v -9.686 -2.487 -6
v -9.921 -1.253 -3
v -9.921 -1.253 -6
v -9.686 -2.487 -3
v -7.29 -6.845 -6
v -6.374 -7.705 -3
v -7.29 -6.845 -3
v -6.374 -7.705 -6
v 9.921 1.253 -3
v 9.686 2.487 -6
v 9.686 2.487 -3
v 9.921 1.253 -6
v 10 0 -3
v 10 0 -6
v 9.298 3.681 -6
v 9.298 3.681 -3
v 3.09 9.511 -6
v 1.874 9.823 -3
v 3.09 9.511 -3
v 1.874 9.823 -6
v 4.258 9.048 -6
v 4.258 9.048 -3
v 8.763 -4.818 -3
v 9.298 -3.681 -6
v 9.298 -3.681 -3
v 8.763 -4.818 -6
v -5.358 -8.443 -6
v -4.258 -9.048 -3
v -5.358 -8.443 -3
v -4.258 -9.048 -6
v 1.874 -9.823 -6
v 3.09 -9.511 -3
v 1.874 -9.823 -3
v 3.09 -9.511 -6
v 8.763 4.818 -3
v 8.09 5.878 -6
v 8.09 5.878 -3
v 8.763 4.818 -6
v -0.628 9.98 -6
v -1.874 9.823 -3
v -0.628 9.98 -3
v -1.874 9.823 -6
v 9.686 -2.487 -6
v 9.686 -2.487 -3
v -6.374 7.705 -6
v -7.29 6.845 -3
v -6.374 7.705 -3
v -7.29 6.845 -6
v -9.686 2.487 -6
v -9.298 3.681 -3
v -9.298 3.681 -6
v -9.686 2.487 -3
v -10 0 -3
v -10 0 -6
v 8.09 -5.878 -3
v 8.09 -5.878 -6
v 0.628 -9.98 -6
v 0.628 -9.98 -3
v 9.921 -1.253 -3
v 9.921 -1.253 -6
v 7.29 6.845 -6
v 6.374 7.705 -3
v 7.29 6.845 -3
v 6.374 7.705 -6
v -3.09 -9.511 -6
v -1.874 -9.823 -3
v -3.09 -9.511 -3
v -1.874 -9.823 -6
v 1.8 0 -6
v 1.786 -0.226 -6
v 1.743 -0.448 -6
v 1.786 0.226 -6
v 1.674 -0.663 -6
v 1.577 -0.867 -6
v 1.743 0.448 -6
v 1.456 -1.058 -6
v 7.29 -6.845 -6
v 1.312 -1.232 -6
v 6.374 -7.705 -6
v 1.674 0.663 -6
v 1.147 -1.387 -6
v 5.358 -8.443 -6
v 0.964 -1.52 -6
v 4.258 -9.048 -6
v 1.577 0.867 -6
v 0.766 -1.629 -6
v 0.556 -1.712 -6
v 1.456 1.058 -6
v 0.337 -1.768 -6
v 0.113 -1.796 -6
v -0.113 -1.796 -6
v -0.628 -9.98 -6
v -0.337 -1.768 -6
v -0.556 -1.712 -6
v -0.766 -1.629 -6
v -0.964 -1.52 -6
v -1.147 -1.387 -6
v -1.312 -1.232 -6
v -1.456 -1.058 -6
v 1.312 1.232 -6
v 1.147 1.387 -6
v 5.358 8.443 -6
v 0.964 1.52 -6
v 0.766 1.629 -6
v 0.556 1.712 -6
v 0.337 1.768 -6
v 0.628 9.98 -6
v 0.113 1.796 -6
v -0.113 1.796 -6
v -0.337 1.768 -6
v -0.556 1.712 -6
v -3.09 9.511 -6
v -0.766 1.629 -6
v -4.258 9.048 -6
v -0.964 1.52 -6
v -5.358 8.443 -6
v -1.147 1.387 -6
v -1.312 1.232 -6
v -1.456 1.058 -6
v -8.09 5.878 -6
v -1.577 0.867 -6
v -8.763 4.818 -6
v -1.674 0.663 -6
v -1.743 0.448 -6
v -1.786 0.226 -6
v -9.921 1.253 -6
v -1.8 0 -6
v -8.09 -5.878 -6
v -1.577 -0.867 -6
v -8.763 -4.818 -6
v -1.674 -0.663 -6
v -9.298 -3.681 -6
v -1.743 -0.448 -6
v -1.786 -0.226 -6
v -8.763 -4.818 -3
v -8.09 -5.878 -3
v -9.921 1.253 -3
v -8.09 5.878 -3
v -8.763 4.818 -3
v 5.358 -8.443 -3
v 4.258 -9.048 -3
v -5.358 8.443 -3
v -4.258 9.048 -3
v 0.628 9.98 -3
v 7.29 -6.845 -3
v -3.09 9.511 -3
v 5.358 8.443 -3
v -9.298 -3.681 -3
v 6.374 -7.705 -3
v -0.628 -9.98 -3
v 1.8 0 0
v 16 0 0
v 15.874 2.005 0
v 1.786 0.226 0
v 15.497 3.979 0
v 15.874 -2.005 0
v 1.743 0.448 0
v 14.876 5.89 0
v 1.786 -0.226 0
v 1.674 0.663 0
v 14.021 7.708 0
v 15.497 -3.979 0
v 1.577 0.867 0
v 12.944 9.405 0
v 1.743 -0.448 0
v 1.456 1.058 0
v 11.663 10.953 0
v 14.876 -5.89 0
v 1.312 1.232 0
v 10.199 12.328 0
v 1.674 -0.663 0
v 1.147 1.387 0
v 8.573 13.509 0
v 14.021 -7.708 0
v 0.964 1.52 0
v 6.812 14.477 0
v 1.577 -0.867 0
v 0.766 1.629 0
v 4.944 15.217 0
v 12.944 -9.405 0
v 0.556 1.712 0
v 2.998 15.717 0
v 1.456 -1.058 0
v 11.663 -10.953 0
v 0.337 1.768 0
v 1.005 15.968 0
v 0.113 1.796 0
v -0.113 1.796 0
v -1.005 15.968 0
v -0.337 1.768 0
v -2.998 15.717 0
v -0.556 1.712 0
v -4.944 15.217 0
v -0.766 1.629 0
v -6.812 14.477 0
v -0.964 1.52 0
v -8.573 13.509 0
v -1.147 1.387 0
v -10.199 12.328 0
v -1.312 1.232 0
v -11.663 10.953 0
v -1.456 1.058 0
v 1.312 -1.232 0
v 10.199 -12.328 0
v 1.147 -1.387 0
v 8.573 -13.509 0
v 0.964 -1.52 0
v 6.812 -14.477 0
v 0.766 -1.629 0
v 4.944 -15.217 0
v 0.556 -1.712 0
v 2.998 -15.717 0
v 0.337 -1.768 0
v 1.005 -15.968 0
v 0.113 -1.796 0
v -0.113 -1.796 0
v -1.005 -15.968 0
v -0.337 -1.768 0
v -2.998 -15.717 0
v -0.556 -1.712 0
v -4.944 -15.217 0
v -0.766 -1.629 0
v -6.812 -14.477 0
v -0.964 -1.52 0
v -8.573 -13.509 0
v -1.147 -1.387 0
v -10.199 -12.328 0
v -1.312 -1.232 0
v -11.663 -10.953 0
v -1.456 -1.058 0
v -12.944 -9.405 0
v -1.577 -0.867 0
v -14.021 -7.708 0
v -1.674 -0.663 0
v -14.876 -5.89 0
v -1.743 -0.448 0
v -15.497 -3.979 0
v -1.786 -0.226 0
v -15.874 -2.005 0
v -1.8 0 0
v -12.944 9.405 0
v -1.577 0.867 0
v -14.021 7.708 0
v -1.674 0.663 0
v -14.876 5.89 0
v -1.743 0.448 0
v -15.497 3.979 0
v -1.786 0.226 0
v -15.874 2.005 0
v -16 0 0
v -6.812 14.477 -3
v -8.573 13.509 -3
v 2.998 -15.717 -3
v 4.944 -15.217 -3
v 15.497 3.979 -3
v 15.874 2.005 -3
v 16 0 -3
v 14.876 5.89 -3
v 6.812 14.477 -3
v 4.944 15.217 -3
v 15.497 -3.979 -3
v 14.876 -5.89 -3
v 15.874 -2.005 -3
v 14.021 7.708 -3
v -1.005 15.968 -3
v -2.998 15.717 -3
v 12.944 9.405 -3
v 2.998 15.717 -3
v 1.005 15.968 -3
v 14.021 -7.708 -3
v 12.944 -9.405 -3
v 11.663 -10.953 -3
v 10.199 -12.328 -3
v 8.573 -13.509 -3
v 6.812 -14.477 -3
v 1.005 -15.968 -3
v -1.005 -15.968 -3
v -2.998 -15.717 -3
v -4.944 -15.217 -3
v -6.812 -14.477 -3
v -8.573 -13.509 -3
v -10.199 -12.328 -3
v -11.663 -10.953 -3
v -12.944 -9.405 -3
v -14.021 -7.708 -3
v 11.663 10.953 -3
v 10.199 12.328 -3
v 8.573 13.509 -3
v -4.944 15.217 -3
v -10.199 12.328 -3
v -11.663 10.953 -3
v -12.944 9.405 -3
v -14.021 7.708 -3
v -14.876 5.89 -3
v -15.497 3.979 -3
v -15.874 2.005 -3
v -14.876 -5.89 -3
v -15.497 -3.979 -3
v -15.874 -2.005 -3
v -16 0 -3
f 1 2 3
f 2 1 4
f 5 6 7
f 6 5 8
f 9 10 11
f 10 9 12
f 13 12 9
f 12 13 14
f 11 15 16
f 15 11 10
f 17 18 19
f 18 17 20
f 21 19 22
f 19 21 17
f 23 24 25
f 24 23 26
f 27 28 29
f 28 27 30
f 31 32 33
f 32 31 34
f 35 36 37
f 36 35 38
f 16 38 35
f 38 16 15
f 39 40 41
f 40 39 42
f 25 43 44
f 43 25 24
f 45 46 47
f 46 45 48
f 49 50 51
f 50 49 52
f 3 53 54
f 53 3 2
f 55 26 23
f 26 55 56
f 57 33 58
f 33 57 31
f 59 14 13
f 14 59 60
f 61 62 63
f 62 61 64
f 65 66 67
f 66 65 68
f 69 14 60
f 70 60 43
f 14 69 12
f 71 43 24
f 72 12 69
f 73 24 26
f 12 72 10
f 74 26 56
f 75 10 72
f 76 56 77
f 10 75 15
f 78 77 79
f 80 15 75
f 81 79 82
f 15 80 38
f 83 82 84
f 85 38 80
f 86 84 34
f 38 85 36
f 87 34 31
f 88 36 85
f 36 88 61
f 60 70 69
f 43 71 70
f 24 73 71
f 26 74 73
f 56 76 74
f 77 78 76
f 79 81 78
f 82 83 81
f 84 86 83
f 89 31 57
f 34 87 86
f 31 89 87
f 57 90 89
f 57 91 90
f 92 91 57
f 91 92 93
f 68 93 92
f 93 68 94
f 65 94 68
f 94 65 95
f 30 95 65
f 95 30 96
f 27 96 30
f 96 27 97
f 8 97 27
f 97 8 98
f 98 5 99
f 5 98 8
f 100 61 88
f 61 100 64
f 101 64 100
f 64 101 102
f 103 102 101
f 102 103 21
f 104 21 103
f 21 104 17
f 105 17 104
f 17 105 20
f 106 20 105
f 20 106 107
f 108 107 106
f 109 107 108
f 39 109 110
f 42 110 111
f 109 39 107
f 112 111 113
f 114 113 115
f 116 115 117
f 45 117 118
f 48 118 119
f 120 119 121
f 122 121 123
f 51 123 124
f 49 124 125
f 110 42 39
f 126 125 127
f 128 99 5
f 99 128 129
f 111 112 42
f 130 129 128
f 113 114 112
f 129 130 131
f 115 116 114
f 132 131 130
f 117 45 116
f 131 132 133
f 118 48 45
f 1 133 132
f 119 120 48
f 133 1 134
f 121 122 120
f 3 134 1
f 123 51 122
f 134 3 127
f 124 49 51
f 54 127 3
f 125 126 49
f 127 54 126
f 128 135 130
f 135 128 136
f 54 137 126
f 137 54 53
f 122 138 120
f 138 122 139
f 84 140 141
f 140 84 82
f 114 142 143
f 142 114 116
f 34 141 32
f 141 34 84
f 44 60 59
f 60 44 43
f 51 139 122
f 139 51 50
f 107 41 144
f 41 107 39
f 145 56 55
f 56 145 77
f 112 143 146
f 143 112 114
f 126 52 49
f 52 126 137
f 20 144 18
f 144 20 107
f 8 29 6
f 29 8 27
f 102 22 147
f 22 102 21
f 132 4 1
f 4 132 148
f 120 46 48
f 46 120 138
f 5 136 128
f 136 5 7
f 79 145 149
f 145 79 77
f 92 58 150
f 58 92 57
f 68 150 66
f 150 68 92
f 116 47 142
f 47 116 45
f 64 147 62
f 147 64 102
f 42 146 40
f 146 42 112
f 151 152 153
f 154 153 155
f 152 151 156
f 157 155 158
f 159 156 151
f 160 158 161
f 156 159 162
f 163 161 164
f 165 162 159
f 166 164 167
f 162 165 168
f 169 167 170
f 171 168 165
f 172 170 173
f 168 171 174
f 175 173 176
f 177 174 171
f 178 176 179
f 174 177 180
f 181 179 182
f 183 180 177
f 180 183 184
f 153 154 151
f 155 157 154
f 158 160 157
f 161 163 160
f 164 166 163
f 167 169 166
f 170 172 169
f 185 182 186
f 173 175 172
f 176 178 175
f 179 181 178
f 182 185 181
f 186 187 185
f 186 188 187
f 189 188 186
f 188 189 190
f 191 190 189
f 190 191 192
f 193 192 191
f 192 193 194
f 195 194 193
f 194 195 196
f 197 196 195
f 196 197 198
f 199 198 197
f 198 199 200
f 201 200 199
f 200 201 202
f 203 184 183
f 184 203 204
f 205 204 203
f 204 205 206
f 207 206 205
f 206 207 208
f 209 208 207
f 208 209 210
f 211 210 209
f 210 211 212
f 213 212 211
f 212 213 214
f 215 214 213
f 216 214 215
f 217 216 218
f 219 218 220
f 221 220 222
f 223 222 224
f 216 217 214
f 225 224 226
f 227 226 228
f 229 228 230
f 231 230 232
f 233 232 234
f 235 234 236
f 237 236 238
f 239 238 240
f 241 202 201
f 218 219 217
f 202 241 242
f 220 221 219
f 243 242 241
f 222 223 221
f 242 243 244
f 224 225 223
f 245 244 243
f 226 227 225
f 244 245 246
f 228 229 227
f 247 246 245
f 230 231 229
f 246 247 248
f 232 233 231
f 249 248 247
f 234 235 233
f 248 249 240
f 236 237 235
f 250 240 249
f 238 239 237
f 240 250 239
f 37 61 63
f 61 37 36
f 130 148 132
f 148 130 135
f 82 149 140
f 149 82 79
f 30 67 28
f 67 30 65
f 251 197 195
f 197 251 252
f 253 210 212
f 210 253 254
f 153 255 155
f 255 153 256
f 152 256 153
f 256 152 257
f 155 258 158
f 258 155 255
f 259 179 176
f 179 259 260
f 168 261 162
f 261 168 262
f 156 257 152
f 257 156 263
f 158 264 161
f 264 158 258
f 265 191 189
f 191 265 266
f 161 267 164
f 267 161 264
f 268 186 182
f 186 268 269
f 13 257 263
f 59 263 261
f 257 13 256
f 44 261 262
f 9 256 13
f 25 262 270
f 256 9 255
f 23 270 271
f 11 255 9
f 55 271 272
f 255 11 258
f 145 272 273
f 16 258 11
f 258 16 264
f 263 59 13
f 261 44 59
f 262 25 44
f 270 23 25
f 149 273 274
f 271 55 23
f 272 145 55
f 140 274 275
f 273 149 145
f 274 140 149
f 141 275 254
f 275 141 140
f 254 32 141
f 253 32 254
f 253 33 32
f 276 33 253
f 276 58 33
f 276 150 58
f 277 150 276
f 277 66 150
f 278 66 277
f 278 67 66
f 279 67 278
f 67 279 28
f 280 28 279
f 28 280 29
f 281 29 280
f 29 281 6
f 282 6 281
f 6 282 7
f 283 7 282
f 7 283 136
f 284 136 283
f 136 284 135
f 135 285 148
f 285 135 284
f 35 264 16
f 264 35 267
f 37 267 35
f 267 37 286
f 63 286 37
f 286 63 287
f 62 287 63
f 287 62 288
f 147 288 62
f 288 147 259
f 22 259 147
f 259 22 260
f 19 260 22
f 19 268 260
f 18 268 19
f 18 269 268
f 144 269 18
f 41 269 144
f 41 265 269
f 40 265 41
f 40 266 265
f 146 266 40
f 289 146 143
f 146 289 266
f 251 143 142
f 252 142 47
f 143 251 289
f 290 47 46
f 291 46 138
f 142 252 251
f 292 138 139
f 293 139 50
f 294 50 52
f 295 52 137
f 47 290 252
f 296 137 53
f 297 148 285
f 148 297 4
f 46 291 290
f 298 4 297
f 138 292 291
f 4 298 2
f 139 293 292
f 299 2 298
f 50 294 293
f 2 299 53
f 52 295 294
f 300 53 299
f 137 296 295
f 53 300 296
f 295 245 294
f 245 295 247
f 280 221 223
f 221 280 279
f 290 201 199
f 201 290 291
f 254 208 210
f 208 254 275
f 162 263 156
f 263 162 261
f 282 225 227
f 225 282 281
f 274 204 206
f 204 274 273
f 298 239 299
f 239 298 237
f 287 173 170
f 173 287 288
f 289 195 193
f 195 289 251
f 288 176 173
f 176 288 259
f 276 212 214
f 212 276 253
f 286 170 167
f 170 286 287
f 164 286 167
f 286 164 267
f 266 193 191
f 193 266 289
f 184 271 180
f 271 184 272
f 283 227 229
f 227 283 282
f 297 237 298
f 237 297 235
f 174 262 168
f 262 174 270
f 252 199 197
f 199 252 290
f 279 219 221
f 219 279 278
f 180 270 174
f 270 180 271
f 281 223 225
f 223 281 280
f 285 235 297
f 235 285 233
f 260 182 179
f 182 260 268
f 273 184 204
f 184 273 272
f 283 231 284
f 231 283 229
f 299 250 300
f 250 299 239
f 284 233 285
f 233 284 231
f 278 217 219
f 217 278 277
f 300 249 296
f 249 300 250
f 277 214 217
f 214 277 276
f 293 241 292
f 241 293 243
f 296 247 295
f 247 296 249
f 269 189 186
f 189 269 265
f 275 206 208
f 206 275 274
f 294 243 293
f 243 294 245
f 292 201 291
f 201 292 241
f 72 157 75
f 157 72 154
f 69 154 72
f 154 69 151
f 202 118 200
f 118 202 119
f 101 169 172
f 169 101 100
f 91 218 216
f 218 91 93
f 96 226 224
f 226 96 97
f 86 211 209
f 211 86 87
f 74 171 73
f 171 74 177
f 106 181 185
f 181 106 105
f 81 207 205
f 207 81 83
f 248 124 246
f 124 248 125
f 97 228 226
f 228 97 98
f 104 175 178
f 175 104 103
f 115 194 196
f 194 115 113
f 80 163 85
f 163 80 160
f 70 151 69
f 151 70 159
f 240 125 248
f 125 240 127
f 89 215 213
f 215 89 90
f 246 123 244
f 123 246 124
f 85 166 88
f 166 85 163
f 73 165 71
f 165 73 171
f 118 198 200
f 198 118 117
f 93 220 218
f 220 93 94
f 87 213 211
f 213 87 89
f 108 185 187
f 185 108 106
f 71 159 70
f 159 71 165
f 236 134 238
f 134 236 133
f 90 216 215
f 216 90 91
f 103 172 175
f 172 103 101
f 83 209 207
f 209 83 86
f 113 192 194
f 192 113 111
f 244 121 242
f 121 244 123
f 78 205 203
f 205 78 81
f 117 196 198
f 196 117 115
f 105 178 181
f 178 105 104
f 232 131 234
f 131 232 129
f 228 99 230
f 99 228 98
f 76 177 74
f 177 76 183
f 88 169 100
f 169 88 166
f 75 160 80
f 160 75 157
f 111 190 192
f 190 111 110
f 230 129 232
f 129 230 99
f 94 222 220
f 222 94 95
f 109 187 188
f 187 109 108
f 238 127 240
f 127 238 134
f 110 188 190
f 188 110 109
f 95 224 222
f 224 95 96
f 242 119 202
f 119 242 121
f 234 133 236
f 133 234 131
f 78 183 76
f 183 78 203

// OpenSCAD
$fn = 50;


difference() {
	union() {
		translate(v = [0, 0, -6.0000000000]) {
			cylinder(h = 6, r = 10.0000000000);
		}
		translate(v = [0, 0, -3.0000000000]) {
			cylinder(h = 3, r = 16.0000000000);
		}
	}
	union() {
		#translate(v = [0, 0, -6]) {
			cylinder(h = 6, r = 1.8000000000);
		}
	}
}
